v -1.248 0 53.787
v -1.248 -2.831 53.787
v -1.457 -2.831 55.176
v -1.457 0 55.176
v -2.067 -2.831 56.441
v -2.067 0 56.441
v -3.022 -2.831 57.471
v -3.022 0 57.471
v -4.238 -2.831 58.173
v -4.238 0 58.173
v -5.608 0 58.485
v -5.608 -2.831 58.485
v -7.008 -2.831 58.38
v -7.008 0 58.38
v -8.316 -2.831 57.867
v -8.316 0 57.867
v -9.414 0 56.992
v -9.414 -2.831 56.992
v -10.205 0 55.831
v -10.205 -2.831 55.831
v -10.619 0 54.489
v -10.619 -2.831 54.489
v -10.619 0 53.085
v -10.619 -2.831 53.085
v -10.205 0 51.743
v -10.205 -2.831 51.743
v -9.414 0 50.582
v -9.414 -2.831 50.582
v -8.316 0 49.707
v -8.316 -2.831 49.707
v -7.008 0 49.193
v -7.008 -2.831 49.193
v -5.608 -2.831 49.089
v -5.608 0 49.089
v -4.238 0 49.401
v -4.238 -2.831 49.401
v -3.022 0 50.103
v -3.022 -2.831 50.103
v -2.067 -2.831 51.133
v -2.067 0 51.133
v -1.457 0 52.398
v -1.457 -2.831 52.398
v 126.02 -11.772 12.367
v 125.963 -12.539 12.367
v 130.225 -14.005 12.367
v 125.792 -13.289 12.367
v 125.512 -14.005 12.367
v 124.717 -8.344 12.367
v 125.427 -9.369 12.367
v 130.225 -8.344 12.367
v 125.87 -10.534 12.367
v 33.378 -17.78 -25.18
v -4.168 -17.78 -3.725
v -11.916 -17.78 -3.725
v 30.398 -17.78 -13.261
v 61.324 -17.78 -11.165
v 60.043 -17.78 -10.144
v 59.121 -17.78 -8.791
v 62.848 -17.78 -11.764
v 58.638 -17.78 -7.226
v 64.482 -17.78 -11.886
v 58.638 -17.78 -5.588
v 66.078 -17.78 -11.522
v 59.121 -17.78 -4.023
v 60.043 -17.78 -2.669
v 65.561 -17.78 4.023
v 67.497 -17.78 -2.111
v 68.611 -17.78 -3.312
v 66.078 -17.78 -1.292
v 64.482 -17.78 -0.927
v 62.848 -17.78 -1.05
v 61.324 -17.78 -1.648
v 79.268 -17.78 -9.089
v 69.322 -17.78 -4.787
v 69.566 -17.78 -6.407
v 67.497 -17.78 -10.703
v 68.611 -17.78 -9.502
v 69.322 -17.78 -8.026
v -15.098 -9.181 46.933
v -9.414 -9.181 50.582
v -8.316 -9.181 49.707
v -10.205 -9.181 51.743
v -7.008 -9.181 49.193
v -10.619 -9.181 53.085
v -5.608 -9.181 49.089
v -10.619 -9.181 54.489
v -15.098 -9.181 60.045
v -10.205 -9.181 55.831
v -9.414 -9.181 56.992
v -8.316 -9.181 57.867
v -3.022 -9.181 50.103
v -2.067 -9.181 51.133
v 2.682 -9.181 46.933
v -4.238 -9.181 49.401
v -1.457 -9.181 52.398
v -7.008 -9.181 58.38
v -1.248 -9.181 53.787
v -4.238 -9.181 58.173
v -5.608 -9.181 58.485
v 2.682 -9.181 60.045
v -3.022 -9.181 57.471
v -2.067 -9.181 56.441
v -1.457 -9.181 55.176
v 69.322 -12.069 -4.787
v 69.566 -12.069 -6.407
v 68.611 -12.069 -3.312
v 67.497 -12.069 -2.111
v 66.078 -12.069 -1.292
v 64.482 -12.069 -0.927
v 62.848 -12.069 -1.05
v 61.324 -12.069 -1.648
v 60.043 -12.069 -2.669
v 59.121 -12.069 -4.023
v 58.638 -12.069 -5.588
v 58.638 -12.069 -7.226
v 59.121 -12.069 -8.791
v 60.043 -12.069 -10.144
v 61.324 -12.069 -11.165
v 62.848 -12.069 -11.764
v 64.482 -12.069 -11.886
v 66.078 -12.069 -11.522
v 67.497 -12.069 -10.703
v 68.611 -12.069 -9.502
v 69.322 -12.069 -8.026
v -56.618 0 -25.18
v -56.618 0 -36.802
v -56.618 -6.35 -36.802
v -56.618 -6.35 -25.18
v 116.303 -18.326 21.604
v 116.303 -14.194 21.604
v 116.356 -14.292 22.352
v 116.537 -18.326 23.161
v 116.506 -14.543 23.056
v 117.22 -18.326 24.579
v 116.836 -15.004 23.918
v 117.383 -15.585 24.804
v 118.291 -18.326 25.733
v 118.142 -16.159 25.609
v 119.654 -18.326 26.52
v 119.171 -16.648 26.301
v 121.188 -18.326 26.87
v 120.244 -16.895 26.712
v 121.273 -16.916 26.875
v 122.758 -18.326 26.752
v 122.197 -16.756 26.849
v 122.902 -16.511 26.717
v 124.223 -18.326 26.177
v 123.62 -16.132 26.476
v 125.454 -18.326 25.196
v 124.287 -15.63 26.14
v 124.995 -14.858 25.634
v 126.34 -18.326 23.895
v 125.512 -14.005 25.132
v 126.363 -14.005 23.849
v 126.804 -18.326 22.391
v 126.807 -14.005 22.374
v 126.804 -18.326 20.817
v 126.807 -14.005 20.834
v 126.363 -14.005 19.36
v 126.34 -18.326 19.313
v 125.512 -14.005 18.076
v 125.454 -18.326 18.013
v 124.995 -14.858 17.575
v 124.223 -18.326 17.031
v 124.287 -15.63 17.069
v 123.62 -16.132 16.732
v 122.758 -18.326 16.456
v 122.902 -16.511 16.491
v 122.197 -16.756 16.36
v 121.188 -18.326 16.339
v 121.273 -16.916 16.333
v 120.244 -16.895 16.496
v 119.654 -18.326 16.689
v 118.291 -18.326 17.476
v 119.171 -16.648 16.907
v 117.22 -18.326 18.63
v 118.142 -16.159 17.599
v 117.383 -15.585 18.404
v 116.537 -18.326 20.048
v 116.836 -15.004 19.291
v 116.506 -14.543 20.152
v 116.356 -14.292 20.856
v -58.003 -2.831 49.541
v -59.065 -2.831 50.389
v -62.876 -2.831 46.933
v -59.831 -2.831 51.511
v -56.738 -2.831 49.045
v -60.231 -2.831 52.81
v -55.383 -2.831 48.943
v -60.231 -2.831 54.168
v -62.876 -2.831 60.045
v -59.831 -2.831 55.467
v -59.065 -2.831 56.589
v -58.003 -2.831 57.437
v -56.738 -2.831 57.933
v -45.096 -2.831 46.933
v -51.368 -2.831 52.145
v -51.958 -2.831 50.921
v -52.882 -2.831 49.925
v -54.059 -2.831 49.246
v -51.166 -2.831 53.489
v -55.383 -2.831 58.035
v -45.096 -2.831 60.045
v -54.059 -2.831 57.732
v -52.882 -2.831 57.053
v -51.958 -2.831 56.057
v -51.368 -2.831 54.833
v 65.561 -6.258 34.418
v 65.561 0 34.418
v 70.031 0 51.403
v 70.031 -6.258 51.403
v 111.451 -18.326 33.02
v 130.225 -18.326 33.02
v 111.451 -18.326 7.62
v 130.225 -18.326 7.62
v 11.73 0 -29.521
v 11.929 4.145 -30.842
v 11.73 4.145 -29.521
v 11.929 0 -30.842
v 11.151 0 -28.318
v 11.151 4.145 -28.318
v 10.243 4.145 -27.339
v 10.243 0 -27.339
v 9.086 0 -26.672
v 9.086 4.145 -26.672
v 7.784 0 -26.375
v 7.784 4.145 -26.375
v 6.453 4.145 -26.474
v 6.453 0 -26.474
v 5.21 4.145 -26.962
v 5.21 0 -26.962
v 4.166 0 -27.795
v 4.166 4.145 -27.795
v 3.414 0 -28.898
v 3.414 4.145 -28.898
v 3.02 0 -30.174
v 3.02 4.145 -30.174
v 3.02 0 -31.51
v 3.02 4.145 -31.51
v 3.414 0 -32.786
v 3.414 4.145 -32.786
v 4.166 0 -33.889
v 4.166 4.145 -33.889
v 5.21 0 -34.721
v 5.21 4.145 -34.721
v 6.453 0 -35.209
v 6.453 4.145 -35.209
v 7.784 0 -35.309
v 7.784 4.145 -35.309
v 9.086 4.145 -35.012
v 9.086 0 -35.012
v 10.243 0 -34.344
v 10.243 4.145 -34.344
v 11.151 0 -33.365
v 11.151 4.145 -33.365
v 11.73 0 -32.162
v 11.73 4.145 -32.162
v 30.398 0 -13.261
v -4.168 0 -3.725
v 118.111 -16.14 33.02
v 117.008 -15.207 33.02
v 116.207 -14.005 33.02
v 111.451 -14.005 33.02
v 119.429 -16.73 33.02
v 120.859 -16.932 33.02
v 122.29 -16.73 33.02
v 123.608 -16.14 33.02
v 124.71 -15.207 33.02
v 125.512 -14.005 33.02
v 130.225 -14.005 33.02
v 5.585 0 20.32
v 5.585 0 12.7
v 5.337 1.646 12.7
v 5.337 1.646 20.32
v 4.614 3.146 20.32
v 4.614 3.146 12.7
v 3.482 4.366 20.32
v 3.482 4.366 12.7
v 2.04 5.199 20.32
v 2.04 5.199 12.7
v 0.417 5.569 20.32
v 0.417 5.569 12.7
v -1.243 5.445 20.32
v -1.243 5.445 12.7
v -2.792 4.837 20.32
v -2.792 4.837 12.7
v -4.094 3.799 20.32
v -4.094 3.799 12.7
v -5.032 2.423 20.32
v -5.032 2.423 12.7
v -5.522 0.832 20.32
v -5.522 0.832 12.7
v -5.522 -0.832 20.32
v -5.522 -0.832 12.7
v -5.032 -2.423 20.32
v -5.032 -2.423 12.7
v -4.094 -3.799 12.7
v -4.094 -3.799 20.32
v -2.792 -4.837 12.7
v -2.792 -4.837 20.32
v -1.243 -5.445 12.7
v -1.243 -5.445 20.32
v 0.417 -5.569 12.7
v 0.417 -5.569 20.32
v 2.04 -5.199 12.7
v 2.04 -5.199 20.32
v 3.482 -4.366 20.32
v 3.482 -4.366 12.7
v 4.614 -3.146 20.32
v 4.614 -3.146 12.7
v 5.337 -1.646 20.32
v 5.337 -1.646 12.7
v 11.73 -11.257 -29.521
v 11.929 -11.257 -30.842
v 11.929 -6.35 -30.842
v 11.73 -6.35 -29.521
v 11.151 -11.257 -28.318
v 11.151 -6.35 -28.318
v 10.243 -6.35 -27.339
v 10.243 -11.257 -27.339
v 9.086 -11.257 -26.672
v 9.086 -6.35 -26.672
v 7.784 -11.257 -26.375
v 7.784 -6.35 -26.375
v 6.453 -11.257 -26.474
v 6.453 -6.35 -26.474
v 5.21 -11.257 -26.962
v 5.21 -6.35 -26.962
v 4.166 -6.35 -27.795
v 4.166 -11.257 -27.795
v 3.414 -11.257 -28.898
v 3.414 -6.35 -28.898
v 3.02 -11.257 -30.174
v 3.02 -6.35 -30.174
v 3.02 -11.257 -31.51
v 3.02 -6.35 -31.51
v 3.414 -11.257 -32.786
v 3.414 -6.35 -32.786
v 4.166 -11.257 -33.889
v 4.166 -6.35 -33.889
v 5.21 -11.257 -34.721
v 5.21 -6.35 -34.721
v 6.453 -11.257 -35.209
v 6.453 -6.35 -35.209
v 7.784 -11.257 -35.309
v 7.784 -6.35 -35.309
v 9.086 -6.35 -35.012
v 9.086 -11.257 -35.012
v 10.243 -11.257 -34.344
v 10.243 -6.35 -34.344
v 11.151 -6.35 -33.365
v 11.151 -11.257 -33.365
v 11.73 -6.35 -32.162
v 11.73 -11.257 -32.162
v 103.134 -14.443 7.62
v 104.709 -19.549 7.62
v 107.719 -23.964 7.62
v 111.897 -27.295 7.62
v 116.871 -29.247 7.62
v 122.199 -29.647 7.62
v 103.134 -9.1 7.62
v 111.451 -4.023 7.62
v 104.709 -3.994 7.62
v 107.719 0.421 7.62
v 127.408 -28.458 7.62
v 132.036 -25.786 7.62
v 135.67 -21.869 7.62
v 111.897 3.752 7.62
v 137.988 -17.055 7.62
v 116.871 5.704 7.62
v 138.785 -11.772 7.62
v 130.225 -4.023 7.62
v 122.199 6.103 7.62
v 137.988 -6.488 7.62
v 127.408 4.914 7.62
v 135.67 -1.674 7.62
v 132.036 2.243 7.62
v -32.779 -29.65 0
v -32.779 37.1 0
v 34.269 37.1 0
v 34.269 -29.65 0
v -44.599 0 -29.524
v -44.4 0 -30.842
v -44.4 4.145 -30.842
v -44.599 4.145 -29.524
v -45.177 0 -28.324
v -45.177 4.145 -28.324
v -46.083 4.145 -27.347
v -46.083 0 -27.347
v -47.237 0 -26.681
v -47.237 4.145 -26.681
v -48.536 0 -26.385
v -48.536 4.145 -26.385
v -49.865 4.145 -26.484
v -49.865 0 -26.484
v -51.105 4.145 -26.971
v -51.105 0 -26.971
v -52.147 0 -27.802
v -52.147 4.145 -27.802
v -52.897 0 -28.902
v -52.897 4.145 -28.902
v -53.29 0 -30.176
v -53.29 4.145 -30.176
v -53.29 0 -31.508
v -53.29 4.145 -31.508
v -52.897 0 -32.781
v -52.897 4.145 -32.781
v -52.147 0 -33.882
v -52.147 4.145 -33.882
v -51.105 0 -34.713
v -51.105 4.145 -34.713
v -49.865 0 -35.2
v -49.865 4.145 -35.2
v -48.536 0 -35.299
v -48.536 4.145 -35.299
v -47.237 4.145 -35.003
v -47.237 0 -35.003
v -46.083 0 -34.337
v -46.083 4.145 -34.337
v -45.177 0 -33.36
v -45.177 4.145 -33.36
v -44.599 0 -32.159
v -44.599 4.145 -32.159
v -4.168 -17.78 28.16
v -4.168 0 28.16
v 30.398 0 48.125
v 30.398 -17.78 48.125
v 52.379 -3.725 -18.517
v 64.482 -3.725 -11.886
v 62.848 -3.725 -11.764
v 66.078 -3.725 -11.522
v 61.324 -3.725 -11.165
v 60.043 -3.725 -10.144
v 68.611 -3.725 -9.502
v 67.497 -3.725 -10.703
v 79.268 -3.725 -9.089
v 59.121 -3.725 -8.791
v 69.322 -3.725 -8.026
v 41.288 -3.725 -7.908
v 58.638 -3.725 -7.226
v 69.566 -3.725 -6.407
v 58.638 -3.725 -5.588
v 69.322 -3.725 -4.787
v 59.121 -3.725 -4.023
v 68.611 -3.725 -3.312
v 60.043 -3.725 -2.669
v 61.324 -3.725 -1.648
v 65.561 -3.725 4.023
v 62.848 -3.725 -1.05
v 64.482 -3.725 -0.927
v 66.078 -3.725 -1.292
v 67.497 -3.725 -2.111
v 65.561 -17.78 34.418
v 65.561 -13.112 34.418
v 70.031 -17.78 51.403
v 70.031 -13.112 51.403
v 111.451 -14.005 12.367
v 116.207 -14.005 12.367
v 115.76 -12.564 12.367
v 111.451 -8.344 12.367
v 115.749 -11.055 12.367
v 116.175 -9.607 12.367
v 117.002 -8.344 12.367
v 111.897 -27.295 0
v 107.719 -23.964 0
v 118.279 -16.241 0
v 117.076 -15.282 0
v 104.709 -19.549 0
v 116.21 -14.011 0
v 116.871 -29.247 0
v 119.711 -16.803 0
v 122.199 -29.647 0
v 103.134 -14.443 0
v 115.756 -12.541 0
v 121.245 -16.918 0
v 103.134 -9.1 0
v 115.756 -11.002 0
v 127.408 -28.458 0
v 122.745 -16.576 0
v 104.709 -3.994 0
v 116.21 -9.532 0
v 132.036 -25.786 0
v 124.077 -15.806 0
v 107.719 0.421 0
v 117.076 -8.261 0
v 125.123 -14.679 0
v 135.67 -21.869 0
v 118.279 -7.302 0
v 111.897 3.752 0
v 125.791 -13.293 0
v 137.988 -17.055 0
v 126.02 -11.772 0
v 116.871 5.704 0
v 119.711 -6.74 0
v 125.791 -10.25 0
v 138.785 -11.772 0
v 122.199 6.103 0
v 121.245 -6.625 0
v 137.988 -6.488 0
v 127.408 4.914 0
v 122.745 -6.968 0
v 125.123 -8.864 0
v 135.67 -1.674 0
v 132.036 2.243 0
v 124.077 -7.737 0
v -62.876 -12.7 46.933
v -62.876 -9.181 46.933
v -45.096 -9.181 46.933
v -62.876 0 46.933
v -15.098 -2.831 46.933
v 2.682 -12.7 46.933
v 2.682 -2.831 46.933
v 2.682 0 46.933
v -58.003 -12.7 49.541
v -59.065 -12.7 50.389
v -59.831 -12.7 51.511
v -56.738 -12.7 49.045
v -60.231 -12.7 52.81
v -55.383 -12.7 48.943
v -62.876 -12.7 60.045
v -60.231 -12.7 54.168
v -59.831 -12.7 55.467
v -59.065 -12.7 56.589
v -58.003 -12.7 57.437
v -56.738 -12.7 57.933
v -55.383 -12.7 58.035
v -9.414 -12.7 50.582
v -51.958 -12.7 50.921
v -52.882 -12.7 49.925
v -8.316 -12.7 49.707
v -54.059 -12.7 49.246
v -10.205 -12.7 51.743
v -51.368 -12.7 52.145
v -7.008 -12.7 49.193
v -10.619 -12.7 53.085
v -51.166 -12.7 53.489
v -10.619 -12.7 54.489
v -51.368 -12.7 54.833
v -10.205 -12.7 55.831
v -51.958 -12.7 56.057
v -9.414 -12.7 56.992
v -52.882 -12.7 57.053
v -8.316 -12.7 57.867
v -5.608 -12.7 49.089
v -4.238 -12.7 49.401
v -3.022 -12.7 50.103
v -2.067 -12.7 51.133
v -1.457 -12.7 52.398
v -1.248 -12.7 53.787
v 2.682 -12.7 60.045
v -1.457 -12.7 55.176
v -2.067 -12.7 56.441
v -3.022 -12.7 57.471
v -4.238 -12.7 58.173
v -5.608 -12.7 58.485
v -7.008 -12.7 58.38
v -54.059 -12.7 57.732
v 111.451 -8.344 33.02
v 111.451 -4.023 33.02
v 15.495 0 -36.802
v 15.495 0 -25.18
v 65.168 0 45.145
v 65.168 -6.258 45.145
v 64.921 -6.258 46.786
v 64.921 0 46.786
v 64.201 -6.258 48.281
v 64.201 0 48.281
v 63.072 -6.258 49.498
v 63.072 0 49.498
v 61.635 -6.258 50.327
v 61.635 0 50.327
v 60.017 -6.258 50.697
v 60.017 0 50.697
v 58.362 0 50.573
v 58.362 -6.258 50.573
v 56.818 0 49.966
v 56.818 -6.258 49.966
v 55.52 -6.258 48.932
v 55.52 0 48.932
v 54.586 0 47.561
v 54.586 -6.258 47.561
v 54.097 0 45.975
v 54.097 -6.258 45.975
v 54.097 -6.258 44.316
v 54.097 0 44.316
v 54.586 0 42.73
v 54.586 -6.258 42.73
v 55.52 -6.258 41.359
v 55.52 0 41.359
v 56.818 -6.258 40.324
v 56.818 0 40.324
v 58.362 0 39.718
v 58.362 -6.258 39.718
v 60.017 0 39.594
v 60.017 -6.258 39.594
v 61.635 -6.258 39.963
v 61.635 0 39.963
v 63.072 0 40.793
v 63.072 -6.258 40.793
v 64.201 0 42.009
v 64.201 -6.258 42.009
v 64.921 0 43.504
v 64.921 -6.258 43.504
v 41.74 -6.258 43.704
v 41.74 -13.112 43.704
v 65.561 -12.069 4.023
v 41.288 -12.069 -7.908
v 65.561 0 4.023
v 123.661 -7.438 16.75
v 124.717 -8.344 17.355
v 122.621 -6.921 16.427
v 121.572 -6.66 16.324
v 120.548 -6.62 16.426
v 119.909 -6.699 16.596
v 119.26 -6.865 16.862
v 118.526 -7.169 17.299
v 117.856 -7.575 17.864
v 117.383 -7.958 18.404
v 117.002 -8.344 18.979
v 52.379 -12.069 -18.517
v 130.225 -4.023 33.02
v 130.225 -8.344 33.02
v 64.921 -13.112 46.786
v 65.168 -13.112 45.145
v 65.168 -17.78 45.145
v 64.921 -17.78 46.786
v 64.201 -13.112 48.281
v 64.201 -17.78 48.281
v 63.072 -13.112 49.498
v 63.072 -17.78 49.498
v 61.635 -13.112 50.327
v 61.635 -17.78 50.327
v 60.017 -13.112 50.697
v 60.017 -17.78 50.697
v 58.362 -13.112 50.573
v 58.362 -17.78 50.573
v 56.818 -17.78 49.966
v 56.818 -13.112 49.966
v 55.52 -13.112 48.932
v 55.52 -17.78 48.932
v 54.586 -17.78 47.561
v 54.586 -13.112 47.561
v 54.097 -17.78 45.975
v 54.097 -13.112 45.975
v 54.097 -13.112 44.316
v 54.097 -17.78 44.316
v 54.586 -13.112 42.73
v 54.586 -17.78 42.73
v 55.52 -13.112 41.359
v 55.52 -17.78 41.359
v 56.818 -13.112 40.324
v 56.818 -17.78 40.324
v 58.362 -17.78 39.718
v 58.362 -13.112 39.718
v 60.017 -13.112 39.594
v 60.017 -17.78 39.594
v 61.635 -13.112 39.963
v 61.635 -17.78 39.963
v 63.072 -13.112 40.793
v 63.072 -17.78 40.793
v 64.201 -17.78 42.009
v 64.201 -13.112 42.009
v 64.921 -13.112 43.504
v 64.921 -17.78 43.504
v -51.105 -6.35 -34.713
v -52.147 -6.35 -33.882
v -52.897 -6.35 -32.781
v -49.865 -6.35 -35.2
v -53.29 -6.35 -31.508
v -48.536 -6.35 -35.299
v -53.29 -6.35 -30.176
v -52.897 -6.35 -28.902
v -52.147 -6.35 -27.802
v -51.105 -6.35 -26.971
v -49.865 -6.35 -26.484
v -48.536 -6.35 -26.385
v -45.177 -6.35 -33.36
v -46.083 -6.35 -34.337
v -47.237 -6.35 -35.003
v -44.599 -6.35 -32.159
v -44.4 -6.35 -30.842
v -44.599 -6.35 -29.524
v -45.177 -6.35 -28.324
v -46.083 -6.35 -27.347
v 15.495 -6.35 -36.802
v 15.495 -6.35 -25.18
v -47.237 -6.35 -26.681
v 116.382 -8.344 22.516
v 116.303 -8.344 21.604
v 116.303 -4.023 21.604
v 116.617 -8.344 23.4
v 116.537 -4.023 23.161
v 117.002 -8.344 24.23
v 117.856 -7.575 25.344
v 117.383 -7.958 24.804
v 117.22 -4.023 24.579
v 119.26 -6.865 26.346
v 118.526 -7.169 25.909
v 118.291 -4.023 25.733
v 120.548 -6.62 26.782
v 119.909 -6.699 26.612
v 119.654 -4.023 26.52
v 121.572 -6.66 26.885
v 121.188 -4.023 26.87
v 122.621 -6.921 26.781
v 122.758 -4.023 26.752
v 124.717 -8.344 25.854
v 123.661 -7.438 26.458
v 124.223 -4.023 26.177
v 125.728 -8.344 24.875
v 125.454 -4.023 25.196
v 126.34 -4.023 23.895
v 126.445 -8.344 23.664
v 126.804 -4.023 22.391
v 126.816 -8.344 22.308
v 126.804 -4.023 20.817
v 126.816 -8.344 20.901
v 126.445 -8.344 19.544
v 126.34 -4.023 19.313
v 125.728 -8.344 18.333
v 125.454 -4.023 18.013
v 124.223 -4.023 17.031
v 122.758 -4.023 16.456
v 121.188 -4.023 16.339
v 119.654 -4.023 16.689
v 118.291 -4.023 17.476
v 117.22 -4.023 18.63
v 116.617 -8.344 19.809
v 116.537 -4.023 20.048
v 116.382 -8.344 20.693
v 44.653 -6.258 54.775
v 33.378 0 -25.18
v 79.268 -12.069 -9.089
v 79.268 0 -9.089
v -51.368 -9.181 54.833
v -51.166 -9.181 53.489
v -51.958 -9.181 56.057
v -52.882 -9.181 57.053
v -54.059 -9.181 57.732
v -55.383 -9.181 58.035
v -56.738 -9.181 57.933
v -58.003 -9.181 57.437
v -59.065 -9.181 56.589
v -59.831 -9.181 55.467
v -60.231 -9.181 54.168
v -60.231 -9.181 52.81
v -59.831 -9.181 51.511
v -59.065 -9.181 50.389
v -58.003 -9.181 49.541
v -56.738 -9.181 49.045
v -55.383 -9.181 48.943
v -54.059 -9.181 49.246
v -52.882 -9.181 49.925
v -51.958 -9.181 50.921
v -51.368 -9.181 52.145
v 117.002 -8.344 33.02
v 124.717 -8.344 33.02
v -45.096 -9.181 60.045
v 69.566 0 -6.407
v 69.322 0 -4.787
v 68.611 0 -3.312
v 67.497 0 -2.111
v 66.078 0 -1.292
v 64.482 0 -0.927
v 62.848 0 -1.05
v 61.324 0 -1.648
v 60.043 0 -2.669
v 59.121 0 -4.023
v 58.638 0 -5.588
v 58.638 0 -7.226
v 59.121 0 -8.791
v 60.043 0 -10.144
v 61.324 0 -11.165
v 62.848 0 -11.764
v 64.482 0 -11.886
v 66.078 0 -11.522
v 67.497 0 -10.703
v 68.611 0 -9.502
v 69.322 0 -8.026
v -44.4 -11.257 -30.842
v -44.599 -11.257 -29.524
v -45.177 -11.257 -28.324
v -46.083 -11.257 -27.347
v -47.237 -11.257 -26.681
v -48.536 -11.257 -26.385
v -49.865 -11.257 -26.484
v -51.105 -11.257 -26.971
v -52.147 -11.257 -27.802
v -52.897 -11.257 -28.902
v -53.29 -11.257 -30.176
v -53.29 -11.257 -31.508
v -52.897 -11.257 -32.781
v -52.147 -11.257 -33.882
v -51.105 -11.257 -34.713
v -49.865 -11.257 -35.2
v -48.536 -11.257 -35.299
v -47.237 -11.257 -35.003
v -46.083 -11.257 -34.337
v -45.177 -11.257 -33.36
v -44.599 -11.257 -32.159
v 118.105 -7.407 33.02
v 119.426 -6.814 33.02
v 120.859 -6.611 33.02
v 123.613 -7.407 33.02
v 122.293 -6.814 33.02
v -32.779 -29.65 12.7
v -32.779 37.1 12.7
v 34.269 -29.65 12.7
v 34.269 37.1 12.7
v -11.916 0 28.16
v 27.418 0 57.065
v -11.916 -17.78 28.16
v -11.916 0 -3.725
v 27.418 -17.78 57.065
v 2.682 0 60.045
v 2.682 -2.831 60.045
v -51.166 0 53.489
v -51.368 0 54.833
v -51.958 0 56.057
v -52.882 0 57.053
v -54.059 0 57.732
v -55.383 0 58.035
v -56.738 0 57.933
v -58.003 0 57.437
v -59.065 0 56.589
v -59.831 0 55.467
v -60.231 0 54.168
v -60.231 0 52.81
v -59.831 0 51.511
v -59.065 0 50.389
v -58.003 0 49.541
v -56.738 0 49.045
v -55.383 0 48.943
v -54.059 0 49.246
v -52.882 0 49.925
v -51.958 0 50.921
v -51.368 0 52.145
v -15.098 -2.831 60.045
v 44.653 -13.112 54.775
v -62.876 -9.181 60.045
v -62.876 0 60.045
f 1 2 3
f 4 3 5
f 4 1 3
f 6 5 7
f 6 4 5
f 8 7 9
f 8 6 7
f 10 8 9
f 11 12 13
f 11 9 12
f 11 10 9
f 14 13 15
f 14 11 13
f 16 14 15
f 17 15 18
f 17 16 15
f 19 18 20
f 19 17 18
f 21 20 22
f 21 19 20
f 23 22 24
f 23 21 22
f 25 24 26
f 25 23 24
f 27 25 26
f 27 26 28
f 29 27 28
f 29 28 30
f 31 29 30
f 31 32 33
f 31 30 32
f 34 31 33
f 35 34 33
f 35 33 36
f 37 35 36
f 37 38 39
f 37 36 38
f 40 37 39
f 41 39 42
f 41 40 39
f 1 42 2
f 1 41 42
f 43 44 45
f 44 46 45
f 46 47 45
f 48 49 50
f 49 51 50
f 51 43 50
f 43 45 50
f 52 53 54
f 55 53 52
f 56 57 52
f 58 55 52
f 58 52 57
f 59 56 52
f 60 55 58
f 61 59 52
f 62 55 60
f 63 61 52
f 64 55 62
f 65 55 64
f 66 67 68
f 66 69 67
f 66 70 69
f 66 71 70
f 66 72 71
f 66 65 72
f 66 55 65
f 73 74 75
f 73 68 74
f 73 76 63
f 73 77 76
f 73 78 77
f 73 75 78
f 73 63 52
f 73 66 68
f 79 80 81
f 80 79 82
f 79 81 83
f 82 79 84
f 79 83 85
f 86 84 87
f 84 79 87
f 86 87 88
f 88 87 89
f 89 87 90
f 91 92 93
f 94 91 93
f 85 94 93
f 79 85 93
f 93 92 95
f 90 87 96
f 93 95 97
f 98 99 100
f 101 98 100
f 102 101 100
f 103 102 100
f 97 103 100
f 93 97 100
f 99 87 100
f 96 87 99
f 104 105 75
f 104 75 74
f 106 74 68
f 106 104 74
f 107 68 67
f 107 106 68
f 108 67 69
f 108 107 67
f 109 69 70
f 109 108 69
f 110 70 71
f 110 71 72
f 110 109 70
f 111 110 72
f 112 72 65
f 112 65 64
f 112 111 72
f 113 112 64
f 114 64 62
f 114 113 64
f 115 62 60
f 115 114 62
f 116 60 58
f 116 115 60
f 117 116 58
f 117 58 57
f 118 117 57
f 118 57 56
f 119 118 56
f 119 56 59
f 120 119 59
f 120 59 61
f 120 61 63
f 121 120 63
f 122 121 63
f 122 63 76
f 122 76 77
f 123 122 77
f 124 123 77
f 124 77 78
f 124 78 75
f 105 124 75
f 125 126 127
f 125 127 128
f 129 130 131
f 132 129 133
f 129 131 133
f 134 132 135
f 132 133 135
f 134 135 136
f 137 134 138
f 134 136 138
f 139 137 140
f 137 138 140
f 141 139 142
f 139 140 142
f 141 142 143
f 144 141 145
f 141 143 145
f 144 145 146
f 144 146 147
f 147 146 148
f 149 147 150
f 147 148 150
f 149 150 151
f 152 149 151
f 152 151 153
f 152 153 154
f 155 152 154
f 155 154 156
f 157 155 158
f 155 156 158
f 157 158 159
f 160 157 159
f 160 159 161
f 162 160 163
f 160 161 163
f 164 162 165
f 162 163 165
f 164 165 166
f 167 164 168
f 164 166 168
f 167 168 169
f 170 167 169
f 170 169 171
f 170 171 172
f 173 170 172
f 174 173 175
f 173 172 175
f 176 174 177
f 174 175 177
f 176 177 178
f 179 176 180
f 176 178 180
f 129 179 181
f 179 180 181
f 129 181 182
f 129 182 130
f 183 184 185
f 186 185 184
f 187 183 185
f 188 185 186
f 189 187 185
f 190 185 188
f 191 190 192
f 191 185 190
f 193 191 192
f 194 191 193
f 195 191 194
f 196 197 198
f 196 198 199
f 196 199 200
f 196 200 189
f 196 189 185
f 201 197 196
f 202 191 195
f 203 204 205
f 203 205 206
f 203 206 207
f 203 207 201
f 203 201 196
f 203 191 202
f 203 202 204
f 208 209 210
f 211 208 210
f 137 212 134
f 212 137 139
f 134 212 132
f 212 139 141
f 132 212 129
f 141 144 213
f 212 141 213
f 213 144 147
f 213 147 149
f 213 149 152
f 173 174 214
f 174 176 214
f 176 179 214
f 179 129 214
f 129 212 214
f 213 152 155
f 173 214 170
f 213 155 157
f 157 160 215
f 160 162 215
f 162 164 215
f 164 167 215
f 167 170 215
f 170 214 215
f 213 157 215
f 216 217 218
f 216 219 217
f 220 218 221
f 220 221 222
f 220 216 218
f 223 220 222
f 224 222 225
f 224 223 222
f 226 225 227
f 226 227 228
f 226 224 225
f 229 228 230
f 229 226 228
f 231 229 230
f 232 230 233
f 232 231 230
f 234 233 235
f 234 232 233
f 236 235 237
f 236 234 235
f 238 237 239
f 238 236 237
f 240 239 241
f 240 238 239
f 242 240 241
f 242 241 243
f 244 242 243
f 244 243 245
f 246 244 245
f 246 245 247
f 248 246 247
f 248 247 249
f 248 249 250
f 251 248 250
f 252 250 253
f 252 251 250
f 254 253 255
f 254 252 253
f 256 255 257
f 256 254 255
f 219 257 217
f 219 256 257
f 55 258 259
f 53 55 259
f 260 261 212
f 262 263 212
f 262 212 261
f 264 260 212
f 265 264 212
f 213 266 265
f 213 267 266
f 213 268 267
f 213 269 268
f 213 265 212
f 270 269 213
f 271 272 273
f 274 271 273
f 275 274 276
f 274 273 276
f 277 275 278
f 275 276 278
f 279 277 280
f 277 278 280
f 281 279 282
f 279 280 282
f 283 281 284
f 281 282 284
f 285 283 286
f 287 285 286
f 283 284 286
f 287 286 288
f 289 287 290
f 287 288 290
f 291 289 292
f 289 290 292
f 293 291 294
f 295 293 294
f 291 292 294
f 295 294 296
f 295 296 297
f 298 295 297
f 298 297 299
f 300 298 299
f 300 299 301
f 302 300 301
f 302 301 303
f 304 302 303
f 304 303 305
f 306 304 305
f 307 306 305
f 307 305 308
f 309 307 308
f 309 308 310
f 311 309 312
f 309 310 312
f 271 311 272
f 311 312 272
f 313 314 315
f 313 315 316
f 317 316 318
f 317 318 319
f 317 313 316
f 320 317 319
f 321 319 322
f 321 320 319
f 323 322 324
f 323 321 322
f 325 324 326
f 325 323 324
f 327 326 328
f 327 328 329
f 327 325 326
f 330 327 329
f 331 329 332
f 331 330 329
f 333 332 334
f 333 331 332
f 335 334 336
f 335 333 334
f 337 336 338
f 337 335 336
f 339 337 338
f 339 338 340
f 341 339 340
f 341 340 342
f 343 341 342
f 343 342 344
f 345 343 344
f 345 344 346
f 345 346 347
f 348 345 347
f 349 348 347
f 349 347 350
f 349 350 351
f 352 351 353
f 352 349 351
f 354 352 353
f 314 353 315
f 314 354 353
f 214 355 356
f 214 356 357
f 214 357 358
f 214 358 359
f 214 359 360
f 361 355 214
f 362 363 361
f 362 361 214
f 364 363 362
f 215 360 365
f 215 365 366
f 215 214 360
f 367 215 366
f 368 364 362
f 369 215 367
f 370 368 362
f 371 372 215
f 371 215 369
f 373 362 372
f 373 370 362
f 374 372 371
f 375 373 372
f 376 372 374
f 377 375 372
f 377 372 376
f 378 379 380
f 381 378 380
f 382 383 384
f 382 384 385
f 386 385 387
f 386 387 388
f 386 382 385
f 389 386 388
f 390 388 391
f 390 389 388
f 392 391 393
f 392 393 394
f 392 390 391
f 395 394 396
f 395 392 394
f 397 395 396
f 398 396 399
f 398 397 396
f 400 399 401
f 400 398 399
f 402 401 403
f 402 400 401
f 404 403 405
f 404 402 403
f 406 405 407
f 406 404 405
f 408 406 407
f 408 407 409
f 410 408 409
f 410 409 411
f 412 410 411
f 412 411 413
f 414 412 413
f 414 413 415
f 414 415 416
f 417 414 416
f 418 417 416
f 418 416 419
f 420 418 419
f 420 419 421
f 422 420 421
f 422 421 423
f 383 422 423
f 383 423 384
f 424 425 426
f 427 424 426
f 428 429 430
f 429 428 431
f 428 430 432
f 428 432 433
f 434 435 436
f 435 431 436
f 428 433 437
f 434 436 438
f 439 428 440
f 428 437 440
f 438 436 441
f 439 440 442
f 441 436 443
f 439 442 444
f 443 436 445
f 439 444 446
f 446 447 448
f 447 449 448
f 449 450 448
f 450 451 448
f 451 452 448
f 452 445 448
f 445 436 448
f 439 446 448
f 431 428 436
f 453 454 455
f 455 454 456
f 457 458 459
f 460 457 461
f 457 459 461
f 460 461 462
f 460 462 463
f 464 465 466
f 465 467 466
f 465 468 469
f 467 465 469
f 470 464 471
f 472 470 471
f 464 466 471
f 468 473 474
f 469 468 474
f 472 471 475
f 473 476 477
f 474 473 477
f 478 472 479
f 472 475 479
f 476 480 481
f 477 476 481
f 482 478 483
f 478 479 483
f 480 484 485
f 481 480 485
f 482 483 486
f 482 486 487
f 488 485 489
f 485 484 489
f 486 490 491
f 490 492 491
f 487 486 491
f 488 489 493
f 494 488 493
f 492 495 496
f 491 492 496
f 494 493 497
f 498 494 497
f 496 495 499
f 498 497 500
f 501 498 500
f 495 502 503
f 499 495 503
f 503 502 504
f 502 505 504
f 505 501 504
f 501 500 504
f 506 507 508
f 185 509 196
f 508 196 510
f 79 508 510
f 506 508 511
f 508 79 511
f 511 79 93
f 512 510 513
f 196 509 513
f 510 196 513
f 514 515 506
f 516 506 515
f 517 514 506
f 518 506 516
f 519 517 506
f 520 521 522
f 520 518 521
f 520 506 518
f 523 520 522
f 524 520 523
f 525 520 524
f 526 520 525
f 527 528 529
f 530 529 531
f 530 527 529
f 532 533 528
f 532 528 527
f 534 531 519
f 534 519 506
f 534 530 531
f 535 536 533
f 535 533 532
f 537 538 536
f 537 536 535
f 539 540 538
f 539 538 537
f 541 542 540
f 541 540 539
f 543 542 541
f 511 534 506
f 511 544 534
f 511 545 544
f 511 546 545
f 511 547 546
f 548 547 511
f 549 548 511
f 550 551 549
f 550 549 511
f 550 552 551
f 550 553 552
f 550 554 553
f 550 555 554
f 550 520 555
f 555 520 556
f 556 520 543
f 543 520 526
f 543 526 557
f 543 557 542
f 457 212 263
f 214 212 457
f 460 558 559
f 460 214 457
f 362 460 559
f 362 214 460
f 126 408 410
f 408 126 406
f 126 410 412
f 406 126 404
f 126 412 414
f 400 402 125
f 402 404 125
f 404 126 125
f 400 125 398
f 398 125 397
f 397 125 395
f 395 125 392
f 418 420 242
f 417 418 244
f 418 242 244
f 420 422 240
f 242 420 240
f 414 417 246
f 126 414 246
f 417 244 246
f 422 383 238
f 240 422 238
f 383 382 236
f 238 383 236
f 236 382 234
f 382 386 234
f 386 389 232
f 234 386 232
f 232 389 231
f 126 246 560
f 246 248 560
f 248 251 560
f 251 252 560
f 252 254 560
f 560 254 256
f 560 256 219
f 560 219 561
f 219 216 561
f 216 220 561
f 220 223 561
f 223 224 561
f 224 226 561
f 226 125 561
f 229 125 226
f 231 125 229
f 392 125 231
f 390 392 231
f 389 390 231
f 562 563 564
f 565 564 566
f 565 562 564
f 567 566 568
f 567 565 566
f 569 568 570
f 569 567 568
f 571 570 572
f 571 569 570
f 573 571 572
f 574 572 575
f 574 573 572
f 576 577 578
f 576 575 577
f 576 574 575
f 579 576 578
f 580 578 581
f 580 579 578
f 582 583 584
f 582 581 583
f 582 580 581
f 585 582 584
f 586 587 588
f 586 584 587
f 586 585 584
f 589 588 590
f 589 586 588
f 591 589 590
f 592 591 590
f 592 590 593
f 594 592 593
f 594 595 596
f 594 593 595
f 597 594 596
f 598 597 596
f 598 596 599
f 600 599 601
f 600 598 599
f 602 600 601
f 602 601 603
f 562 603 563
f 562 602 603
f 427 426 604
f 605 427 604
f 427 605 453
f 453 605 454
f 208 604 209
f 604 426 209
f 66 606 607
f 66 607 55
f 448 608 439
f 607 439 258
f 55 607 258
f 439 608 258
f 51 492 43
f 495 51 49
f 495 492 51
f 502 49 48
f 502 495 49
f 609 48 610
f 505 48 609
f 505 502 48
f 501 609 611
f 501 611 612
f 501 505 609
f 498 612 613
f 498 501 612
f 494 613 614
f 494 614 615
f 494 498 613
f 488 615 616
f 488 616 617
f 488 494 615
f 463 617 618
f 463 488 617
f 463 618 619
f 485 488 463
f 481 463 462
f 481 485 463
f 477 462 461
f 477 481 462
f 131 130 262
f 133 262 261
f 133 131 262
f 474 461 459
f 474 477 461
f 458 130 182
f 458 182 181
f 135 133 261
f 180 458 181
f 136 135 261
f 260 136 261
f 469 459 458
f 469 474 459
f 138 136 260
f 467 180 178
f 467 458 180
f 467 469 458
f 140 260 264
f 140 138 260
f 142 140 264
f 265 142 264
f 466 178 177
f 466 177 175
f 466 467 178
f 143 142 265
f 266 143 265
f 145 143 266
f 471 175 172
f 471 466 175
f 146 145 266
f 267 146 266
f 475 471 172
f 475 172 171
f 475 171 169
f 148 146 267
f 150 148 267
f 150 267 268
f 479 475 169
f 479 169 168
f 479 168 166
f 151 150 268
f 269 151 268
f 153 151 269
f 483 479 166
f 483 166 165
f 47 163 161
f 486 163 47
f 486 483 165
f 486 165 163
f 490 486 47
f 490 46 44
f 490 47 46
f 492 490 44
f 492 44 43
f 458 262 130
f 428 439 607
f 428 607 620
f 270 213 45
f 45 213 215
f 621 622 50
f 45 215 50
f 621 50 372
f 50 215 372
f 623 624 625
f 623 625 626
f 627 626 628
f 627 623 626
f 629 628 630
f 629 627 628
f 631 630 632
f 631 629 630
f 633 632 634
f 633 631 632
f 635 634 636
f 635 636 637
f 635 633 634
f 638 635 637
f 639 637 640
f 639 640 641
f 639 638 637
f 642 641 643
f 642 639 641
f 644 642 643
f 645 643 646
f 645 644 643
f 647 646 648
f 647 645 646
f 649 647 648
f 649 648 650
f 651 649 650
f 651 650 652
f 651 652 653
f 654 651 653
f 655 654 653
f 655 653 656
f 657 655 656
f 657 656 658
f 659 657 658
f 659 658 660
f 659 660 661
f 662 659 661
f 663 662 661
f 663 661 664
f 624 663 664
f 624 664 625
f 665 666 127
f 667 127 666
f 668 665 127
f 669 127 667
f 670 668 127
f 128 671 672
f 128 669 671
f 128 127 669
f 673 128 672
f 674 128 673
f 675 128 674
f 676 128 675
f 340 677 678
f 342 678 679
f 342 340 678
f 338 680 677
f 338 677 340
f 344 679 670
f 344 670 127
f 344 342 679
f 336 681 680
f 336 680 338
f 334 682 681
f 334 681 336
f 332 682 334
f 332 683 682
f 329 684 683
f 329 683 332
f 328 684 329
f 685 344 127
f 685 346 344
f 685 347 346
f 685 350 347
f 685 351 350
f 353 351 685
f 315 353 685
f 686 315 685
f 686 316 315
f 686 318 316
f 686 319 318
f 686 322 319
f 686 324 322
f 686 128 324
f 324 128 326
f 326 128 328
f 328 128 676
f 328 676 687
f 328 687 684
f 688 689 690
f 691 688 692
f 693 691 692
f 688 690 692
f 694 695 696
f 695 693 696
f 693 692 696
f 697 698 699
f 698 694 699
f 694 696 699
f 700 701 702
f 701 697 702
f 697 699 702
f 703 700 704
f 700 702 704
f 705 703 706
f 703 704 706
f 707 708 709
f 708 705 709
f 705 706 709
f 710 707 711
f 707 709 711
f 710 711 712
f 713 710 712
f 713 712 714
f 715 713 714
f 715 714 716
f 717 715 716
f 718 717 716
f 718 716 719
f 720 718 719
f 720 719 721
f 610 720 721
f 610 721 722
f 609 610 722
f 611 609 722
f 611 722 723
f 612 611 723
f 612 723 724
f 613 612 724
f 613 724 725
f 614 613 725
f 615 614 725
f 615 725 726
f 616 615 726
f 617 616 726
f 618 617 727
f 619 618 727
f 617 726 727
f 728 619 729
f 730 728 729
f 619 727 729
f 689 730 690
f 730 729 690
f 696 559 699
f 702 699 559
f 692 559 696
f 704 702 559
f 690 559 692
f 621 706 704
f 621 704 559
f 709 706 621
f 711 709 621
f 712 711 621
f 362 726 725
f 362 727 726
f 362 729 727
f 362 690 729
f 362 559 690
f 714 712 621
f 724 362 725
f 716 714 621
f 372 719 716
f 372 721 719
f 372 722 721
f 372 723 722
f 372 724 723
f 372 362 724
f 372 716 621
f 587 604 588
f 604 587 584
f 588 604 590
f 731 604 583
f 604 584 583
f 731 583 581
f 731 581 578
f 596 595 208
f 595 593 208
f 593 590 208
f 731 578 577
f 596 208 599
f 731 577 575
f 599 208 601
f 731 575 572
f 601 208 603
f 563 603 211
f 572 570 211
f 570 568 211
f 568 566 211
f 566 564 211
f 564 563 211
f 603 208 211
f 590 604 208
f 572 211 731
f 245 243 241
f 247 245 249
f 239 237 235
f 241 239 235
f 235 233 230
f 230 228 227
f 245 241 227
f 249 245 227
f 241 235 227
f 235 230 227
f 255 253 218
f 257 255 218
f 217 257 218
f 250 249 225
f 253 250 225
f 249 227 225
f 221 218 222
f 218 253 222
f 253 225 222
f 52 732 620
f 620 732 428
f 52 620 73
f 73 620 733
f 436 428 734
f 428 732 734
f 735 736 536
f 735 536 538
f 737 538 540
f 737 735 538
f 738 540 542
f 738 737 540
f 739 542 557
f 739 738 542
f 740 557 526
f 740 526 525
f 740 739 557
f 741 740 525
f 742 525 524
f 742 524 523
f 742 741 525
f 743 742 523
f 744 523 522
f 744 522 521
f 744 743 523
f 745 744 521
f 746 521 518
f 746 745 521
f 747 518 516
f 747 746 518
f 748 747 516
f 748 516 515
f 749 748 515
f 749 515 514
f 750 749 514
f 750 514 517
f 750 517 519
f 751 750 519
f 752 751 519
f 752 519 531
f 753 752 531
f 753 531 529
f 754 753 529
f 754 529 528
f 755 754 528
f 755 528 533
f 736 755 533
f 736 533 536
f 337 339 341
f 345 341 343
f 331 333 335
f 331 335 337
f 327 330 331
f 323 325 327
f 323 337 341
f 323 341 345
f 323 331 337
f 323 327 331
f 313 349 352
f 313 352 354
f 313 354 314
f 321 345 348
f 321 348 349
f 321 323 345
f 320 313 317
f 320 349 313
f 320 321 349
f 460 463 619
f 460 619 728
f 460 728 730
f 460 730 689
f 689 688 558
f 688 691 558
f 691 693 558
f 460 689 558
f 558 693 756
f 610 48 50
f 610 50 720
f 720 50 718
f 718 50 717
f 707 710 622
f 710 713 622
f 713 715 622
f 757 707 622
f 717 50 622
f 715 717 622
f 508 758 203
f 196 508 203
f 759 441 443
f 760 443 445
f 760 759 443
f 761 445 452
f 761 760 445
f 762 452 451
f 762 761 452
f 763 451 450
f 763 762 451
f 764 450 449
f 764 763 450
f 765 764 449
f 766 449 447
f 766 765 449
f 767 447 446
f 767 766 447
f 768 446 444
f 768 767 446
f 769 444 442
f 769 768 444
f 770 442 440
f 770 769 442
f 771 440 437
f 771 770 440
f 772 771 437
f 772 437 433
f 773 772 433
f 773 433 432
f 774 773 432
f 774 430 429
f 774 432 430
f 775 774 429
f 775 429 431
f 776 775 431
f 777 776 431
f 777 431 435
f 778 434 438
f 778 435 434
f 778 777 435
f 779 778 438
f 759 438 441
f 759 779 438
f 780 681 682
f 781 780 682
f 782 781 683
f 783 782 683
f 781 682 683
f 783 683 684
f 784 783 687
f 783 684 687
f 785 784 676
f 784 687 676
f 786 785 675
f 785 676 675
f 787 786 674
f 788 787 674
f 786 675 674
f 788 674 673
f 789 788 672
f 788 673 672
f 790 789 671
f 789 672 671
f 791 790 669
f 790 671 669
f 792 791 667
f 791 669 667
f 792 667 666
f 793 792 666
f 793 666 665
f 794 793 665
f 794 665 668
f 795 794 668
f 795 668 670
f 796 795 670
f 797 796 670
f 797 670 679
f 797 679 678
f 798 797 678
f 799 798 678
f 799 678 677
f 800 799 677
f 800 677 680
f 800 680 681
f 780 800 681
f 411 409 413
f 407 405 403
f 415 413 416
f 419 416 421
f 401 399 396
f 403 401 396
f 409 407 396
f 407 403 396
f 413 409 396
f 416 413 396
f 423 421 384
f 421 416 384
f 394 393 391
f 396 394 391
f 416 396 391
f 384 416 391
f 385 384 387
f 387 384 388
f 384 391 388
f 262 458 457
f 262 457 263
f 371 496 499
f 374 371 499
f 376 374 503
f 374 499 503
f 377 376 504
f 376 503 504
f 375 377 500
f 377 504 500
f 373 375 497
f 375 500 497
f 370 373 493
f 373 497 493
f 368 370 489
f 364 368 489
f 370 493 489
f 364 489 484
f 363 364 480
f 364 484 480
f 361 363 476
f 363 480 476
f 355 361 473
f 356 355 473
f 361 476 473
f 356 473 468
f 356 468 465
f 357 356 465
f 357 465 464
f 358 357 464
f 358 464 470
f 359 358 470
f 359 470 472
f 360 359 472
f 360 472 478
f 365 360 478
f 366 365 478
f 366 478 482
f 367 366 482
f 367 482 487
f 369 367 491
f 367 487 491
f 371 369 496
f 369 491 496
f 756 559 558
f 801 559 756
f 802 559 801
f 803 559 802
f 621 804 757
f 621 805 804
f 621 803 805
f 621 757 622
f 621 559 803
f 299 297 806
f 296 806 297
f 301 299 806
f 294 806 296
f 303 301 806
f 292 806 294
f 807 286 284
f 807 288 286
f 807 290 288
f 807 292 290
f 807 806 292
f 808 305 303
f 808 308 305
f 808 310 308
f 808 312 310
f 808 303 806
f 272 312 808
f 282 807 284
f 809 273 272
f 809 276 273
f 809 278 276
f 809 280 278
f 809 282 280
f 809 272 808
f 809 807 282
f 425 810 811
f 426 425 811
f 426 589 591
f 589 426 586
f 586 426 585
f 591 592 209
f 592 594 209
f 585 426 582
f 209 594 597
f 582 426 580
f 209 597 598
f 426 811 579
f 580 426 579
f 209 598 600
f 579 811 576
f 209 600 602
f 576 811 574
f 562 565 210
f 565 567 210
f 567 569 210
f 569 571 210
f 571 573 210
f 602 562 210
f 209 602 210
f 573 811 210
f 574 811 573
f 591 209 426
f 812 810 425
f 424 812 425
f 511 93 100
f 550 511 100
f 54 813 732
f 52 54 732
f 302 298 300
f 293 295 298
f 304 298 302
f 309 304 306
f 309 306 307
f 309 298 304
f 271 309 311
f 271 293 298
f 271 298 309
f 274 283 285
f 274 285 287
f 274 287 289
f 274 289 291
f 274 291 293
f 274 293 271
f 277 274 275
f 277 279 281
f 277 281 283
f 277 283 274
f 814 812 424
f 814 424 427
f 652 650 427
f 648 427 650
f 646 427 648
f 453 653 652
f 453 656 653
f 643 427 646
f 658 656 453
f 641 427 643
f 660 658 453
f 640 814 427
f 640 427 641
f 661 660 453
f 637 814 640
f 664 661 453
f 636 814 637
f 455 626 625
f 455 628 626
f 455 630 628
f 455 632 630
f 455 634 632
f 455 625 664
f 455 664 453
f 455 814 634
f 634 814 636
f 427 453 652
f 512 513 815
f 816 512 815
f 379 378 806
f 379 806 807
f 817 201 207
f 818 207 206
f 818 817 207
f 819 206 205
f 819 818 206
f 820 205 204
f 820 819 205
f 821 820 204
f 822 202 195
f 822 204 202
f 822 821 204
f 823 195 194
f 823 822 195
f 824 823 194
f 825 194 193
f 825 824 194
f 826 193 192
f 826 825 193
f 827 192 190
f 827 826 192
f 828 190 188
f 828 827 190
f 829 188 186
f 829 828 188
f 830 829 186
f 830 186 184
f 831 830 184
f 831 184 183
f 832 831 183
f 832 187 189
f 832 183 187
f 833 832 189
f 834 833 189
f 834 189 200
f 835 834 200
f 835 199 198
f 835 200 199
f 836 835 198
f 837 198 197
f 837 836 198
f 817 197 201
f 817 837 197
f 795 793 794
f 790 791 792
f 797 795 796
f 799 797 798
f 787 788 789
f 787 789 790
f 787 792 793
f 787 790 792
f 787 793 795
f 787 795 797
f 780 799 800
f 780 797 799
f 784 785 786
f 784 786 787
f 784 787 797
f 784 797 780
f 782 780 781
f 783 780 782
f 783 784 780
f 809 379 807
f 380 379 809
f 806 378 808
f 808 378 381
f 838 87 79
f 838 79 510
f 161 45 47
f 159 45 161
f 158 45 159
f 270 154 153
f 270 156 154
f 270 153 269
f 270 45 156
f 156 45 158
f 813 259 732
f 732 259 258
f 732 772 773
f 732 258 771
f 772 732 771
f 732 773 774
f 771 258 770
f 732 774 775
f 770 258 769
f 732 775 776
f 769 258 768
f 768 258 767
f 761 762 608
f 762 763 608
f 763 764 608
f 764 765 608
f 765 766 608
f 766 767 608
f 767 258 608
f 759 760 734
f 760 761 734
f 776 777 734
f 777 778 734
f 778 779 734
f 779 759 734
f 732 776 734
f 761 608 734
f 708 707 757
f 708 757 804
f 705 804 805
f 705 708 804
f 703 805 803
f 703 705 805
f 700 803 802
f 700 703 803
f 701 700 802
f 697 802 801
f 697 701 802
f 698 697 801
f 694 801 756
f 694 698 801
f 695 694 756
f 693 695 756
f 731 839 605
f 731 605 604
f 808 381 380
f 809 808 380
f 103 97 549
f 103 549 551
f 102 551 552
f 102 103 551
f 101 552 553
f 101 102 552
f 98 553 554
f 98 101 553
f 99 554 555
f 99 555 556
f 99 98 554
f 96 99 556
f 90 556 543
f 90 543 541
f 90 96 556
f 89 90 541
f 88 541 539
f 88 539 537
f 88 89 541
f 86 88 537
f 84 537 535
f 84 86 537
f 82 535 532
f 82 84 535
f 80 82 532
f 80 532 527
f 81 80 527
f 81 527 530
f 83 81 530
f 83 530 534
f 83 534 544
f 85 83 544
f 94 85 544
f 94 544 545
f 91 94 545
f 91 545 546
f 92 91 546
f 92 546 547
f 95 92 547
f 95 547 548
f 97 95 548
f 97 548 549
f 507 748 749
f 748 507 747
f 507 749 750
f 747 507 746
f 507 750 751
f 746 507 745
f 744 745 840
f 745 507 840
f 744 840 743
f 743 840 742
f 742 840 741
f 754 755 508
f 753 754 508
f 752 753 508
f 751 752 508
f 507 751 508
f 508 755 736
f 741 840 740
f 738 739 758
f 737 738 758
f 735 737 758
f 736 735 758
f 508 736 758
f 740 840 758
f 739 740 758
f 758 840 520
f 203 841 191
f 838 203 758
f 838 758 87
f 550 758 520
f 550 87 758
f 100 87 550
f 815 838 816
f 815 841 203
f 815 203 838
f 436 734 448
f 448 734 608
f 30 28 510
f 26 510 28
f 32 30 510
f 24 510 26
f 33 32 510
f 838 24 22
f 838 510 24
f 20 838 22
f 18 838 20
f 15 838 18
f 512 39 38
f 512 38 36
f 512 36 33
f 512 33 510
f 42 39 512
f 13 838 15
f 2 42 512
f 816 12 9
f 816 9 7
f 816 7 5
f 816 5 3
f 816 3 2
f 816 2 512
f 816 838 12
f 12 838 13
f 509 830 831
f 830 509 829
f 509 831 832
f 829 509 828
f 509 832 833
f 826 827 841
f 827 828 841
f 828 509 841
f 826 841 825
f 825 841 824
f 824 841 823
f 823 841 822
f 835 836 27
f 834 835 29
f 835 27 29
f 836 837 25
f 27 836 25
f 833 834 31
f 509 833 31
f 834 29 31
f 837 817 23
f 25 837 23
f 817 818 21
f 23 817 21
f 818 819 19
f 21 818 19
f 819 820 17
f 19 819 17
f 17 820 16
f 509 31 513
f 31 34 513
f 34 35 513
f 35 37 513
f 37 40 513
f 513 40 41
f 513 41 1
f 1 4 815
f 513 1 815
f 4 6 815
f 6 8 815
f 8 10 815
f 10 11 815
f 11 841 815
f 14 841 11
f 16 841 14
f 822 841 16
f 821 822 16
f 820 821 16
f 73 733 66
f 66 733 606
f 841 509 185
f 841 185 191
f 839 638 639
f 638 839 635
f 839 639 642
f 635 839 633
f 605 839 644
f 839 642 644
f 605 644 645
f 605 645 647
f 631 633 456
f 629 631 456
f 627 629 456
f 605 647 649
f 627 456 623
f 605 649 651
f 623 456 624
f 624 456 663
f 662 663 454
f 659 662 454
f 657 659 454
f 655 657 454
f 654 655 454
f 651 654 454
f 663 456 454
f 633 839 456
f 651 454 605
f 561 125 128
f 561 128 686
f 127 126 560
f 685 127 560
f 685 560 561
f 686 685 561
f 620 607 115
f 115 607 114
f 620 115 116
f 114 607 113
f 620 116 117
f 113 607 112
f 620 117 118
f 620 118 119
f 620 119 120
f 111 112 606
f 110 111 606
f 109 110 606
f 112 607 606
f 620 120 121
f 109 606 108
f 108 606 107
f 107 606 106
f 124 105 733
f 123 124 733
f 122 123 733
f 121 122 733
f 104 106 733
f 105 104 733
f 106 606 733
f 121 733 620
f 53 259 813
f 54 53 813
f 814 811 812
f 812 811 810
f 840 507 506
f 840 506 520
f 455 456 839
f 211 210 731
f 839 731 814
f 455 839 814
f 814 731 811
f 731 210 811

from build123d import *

# Parameters (mm, degrees)
F0_W      = 67.0474879444
F0_H      = 66.7495001107
F1_DEPTH  = 12.7
F2_W      = 65.5575403944
F2_H      = 13.1115093827
F2_R      = 4.5583548695
F2_R_2    = 4.711616035
F3_DEPTH  = 12.7
F4_W      = 17.78
F4_H      = 6.35
F5_DEPTH  = 25.4
F6_W      = 72.113298811
F6_H      = 11.6215646267
F7_DEPTH  = 6.35
F8_R      = 4.4698342681
F8_R_2    = 4.4797530181
F9_DEPTH  = 18.1154
F10_R     = 5.5848049297
F11_DEPTH = 7.62
F12_R     = 17.9251364519
F12_R_2   = 5.1607945496
F13_DEPTH = 7.62
F14_W     = 18.7732949853
F14_H     = 14.3034630455
F14_R     = 5.1607945496
F15_DEPTH = 25.4
F16_W     = 5.6617893279
F16_H     = 20.6534639266
F17_DEPTH = 25.4
F18_R     = 5.2803719503
F19_DEPTH = 25.4
F20_DEPTH = 7.62
F21_DEPTH = 17.78
F22_DEPTH = 13.208
F23_DEPTH = 13.208
F24_DEPTH = 7.62
F25_R     = 5.566890583
F26_DEPTH = 17.78
F25_R_2   = 5.4946431506
F27_W     = 6.8537420593
F27_H     = 10.1684303929
F27_H_2   = 17.5636542543
F27_H_3   = 4.3138757791
F28_DEPTH = 25.4
F29_W     = 18.9685716476
F29_H     = 8.3436870482
F29_W_2   = 9.4842951334
F29_W_3   = 9.8966461836
F30_DEPTH = 25.4


with BuildPart() as f1:
    # F0 (on Top) → F1 (new body)
    with BuildSketch(Plane.XY):
        with Locations((0.7449742407, 3.7248609588)):
            Rectangle(F0_W, F0_H)
    extrude(amount=F1_DEPTH)

    # F10 (on face) → F11 (join)
    with BuildSketch(Plane.XY.offset(12.7)):
        Circle(F10_R)
    extrude(amount=F11_DEPTH)



with BuildPart() as f3:
    # F2 (on Front) → F3 (new body)
    with BuildSketch(Plane.XZ):
        with Locations((-30.0968731754, 53.4889958799)):
            Rectangle(F2_W, F2_H)
        with Locations((-55.7239130139, 53.4889958799)):
            Circle(F2_R, mode=Mode.SUBTRACT)
        with Locations((-5.9597766958, 53.7869818509)):
            Circle(F2_R_2, mode=Mode.SUBTRACT)
    extrude(amount=F3_DEPTH)

    # F4 (on face) → F5 (cut)
    with BuildSketch(Plane.XY.offset(60.0447505713)):
        with Locations((-53.9856433725, -6.0058937326)):
            Rectangle(F4_W, F4_H)
        with Locations((-6.2081029782, -6.0058937326)):
            Rectangle(F4_W, F4_H)
    extrude(amount=-F5_DEPTH, mode=Mode.SUBTRACT)


with BuildPart() as f7:
    # F6 (on Front) → F7 (new body)
    with BuildSketch(Plane.XZ):
        with Locations((-20.5612289719, -30.9908390045)):
            Rectangle(F6_W, F6_H)
    extrude(amount=F7_DEPTH)

    # F8 (on face) → F9 (join, symmetric)
    with BuildSketch(Plane.XZ.offset(6.35)):
        with Locations((-48.8701686263, -30.8418441564)):
            Circle(F8_R)
        with Locations((7.4497233145, -30.8418441564)):
            Circle(F8_R_2)
    extrude(amount=F9_DEPTH, both=True)

    # F20 (cut): a face of the model
    f20_faces = [f7.faces().sort_by_distance(p)[0] for p in [
        (7.4497233145, 11.7654, -30.8418441564),
    ]]
    extrude(f20_faces, amount=-F20_DEPTH, mode=Mode.SUBTRACT)


with BuildPart() as f13:
    # F12 (on Top) → F13 (new body)
    with BuildSketch(Plane.XY):
        with Locations((120.8594217896, -11.7715625092)):
            Circle(F12_R)
        with Locations((120.8594217896, -11.7715625092)):
            Circle(F12_R_2, mode=Mode.SUBTRACT)
    extrude(amount=F13_DEPTH)

    # F14 (on face) → F15 (join)
    with BuildSketch(Plane.XY.offset(7.62)):
        with Locations((120.8379231393, -11.1745807808)):
            Rectangle(F14_W, F14_H)
        with Locations((120.8594217896, -11.7715625092)):
            Circle(F14_R, mode=Mode.SUBTRACT)
    extrude(amount=F15_DEPTH)

    # F16 (on face) → F17 (cut)
    with BuildSketch(Plane.YZ.offset(130.224570632)):
        with Locations((-11.1745819449, 22.6932680367)):
            Rectangle(F16_W, F16_H)
    extrude(amount=-F17_DEPTH, mode=Mode.SUBTRACT)

    # F18 (on face) → F19 (cut)
    with BuildSketch(Plane(origin=(0, -4.022849258, 0), x_dir=(-1, 0, 0), z_dir=(0, 1, 0))):
        with Locations((-121.5828880668, 21.6041896492)):
            Circle(F18_R)
    extrude(amount=-F19_DEPTH, mode=Mode.SUBTRACT)


with BuildPart() as f1_1:
    add(f1.part)
    # F21 (cut): a face of the model
    f21_faces = [f7.part.faces().sort_by_distance(p)[0] for p in [
        (7.4497233145, -24.4654, -30.8418441564),
    ]]
    extrude(f21_faces, amount=F21_DEPTH, mode=Mode.SUBTRACT)


with BuildPart() as f7_1:
    add(f7.part)

    # F22 (cut): a face of the model
    f22_faces = [f7_1.faces().sort_by_distance(p)[0] for p in [
        (7.4497233145, -24.4654, -30.8418441564),
    ]]
    extrude(f22_faces, amount=-F22_DEPTH, mode=Mode.SUBTRACT)

    # F23 (cut): a face of the model
    f23_faces = [f7_1.faces().sort_by_distance(p)[0] for p in [
        (-48.8701686263, -24.4654, -30.8418441564),
    ]]
    extrude(f23_faces, amount=-F23_DEPTH, mode=Mode.SUBTRACT)

    # F24 (cut): a face of the model
    f24_faces = [f7_1.faces().sort_by_distance(p)[0] for p in [
        (-48.8701686263, 11.7654, -30.8418441564),
    ]]
    extrude(f24_faces, amount=-F24_DEPTH, mode=Mode.SUBTRACT)


with BuildPart() as f26:
    # F25 (on Front) → F26 (new body)
    with BuildSketch(Plane.XZ):
        Polygon((65.5609965324, 34.417707473), (70.03082335, 51.4030717313), (27.4184215814, 57.0648610592), (-11.9161028415, 28.1599443406), (-4.168394953, 28.1599443406), (30.3983129561, 48.1251962483), align=None)
        with Locations((59.6012175083, 45.1453104615)):
            Circle(F25_R, mode=Mode.SUBTRACT)
    extrude(amount=F26_DEPTH)

    # F27 (on face) → F28 (cut)
    with BuildSketch(Plane(origin=(52.8441588548, 0, -13.9063392934), x_dir=(0, 1, 0), z_dir=(0.9670746197, 0, -0.2544929861))):
        with Locations((-9.6846364904, 72.6171745931)):
            Rectangle(F27_W, F27_H)
        with Locations((-9.6846364904, 58.7511322695)):
            Rectangle(F27_W, F27_H_2)
        with Locations((-9.6846364904, 47.8123672528)):
            Rectangle(F27_W, F27_H_3)
    extrude(amount=-F28_DEPTH, mode=Mode.SUBTRACT)


with BuildPart() as f26b:
    # F25 (on Front) → F26, piece 2 (new body)
    with BuildSketch(Plane.XZ):
        Polygon((79.2684778571, -9.088659659), (65.5609965324, 4.022849258), (30.3983129561, -13.2605032995), (-4.168394953, -3.7248602603), (-11.9161028415, -3.7248602603), (33.3782024682, -25.1800566912), align=None)
        with Locations((64.0710517764, -6.4067598432)):
            Circle(F25_R_2, mode=Mode.SUBTRACT)
    extrude(amount=F26_DEPTH)

    # F29 (on face) → F30 (cut)
    with BuildSketch(Plane(origin=(33.33375797, 0, 34.8489153876), x_dir=(0.7226417244, 0, -0.6912227848), z_dir=(0.6912227848, 0, 0.7226417244))):
        with Locations((54.0807123441, -7.8967037844)):
            Rectangle(F29_W, F29_H)
        with Locations((39.8542789537, -7.8967037844)):
            Rectangle(F29_W_2, F29_H)
        with Locations((68.5133212597, -7.8967037844)):
            Rectangle(F29_W_3, F29_H)
    extrude(amount=-F30_DEPTH, mode=Mode.SUBTRACT)


solid = Compound([f3.part, f13.part, f1_1.part, f7_1.part, f26.part, f26b.part])
